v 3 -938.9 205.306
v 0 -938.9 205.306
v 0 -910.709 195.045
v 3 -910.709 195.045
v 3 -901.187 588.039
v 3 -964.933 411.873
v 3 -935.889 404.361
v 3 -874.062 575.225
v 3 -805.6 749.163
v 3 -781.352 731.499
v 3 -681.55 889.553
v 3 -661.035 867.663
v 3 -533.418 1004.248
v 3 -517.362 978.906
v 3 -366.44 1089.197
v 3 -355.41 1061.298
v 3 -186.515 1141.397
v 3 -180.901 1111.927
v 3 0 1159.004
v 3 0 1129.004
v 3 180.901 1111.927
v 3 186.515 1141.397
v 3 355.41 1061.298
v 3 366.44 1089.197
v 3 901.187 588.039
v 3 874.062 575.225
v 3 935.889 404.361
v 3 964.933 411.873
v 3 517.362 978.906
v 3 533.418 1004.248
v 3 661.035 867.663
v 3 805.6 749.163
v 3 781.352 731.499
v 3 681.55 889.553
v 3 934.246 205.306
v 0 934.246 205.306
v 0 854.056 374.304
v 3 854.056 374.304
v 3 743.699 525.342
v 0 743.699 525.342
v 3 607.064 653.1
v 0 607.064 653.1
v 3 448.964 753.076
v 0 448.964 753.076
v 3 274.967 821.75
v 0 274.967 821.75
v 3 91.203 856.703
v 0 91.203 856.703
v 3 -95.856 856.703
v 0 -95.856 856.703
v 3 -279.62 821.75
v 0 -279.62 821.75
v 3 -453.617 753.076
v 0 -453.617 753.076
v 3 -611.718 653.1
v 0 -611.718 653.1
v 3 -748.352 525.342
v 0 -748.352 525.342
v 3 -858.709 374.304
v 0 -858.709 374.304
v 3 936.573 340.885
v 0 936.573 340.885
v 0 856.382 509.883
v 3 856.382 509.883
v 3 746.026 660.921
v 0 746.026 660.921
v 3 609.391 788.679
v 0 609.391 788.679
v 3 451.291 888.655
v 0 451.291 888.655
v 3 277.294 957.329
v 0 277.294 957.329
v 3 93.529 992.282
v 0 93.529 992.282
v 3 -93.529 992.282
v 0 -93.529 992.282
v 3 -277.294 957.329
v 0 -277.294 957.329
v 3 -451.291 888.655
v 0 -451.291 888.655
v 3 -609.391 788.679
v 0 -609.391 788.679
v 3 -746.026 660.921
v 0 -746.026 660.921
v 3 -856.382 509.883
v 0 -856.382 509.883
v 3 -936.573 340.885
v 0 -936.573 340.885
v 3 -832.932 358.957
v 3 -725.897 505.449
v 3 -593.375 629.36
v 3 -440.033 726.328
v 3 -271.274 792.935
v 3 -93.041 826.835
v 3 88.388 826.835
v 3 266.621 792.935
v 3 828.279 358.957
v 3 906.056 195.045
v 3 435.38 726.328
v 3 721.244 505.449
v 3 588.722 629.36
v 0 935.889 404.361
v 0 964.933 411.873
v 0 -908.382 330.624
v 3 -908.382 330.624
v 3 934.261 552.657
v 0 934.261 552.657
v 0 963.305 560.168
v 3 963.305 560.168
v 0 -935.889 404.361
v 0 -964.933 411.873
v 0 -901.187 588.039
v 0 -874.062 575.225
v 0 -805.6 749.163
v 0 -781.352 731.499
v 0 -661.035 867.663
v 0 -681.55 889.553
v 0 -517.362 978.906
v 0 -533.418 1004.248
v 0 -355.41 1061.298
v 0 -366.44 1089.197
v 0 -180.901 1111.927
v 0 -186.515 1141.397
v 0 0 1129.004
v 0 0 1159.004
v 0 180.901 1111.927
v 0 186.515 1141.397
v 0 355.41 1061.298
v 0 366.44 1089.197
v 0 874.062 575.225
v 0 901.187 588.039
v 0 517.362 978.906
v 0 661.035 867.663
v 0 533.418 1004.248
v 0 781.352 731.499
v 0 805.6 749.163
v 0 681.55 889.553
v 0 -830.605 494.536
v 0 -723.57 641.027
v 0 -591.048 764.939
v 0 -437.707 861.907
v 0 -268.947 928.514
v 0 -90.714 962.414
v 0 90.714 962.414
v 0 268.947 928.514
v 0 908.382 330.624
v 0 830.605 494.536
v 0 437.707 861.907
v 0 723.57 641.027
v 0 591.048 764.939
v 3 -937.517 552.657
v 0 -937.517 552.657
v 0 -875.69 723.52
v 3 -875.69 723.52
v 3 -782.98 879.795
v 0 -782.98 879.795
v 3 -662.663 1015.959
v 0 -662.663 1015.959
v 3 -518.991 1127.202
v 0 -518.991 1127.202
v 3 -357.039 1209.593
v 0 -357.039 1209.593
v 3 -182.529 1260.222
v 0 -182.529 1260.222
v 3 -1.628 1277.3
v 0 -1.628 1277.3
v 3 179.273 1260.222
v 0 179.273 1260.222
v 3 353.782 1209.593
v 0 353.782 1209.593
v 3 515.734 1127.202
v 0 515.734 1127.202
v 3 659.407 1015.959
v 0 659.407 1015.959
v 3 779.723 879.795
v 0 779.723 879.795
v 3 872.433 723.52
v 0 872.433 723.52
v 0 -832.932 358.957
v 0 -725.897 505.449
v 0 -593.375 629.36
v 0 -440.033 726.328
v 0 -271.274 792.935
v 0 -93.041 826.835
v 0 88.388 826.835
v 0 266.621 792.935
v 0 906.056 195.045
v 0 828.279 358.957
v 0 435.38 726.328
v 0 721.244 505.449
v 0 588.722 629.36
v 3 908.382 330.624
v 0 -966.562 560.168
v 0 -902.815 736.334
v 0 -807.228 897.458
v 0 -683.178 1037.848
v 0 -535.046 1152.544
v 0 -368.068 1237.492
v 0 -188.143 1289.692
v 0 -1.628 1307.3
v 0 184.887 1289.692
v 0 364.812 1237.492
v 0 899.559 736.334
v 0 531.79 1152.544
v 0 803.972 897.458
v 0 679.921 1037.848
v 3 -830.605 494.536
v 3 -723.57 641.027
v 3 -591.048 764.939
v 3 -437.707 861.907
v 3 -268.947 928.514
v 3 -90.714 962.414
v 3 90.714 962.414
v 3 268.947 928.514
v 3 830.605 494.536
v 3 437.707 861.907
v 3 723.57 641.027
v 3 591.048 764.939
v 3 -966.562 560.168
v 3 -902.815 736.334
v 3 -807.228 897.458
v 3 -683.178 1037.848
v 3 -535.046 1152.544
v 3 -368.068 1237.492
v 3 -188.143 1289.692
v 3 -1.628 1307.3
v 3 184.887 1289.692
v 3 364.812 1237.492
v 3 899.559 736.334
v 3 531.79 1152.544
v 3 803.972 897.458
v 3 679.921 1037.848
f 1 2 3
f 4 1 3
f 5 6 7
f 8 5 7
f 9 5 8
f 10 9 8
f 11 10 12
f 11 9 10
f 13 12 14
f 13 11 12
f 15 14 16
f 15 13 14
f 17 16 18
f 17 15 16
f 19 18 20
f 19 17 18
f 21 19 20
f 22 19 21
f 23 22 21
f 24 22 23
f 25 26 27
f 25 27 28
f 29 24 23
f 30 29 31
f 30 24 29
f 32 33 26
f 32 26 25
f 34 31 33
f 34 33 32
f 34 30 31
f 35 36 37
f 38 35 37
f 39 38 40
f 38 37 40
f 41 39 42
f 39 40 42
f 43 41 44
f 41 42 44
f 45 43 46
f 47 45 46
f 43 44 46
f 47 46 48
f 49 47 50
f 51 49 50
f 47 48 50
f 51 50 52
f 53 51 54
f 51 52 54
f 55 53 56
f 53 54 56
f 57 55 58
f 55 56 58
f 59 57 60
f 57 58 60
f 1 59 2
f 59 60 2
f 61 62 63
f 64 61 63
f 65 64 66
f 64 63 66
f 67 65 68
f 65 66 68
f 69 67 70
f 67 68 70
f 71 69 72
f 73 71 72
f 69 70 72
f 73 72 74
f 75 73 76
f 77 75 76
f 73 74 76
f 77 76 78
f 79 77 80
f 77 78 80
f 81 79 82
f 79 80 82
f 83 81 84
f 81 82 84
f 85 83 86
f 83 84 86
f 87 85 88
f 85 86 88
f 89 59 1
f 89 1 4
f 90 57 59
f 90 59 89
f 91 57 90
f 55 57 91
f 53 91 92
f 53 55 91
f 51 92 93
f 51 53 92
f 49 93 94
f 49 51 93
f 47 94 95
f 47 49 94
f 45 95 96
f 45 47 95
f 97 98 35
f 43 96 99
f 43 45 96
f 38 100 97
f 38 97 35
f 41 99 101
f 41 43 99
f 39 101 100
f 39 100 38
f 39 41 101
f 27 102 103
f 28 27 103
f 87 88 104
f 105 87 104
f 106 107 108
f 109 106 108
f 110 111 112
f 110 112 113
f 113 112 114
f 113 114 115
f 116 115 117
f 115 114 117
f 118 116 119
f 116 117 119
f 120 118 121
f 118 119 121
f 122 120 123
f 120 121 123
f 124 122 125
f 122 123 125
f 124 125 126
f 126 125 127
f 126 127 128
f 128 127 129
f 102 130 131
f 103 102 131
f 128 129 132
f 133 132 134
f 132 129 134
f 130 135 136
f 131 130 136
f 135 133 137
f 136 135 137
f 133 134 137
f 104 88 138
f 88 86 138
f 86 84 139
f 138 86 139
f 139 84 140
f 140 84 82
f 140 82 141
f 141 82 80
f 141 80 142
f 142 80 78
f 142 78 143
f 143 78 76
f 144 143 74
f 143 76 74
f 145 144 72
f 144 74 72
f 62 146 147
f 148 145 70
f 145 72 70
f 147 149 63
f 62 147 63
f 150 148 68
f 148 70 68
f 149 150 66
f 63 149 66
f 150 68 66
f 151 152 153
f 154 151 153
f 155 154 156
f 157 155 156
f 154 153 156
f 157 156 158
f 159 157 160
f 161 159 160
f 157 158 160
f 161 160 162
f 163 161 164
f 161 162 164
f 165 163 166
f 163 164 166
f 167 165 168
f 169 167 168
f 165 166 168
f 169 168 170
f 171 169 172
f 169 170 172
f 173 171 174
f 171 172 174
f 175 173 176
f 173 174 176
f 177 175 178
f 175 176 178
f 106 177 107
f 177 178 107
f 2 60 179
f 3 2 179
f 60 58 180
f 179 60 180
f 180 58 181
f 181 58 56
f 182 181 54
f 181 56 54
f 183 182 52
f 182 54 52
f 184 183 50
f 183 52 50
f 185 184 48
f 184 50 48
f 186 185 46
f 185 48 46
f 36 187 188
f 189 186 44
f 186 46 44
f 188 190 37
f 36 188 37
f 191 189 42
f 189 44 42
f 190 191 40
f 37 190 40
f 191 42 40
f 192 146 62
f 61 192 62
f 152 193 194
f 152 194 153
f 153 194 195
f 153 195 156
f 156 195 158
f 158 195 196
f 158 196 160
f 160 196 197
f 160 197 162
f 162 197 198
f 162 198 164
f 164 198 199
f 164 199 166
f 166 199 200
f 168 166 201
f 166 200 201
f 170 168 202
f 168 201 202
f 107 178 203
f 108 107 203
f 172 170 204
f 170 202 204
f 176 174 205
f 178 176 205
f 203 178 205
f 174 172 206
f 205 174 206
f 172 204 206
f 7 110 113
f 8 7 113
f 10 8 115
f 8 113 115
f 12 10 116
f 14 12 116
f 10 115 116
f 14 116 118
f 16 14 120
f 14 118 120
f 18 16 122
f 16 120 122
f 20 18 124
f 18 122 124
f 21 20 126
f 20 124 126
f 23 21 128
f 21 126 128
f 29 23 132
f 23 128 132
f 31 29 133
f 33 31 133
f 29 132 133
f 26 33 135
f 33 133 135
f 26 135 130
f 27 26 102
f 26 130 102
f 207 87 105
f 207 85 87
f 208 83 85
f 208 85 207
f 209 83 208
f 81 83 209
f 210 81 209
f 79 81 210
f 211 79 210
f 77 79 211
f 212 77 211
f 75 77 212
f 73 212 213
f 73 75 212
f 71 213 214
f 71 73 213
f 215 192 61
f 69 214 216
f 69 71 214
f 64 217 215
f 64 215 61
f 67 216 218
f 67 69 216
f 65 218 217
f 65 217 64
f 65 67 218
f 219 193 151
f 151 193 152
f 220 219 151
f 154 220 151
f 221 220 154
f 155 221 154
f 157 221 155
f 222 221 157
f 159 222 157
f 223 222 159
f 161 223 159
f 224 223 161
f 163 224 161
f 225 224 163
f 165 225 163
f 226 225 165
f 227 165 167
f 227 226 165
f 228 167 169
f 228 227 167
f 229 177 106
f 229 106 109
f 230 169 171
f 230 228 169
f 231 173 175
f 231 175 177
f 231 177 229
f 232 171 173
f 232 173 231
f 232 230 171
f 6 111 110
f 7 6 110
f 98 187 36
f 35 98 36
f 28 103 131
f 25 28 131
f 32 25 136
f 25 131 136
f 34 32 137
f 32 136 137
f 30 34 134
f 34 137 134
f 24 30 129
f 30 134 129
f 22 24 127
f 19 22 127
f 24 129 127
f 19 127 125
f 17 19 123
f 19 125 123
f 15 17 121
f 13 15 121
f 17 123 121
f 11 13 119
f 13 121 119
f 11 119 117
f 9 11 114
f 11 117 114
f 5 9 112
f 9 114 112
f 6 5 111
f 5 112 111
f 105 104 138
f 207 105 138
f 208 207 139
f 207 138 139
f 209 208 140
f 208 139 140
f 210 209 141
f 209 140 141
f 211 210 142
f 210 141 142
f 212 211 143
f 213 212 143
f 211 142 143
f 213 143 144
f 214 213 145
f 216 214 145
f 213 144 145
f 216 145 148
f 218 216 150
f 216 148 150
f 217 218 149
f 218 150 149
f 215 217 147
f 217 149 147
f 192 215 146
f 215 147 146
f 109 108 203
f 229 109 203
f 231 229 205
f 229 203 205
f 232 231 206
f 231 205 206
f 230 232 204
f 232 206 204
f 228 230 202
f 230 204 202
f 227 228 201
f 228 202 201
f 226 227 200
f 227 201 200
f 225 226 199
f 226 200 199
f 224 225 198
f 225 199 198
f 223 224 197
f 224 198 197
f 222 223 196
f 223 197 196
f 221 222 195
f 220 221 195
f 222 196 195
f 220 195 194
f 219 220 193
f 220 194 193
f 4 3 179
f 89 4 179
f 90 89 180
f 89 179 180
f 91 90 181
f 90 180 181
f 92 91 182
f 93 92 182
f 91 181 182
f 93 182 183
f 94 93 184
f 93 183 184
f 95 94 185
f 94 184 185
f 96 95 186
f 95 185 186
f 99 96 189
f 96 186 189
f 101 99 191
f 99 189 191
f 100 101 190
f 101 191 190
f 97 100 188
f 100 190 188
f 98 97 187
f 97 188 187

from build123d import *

# Parameters (mm, degrees)
F1_DEPTH = 3
F3_DEPTH = 3


with BuildPart() as f1:
    # F0 (on Right) → F1 (new body)
    with BuildSketch(Plane.YZ):
        with BuildLine():
            Line((-936.572938, 340.884672), (-908.38216, 330.624067))
            ThreePointArc((-908.38216, 330.624067), (0, 966.680103), (908.38216, 330.624067))
            Line((908.38216, 330.624067), (936.572938, 340.884672))
            ThreePointArc((936.572938, 340.884672), (0, 996.680103), (-936.572938, 340.884672))
        make_face()
        with BuildLine():
            ThreePointArc((934.246348, 205.305699), (-2.32659, 861.10113), (-938.899528, 205.305699))
            Line((-938.899528, 205.305699), (-910.708749, 195.045094))
            ThreePointArc((-910.708749, 195.045094), (-2.32659, 831.10113), (906.05557, 195.045094))
            Line((906.05557, 195.045094), (934.246348, 205.305699))
        make_face()
    extrude(amount=F1_DEPTH)


with BuildPart() as f3:
    # F2 (on Right) → F3 (new body)
    with BuildSketch(Plane.YZ):
        with BuildLine():
            Line((-964.933472, 411.872894), (-935.889042, 404.361494))
            ThreePointArc((-935.889042, 404.361494), (0, 1129.004215), (935.889042, 404.361494))
            Line((935.889042, 404.361494), (964.933472, 411.872894))
            ThreePointArc((964.933472, 411.872894), (0, 1159.004215), (-964.933472, 411.872894))
        make_face()
        with BuildLine():
            Line((-966.561655, 560.168488), (-937.517226, 552.657088))
            ThreePointArc((-937.517226, 552.657088), (-1.628183, 1277.299809), (934.260859, 552.657088))
            Line((934.260859, 552.657088), (963.305288, 560.168488))
            ThreePointArc((963.305288, 560.168488), (-1.628183, 1307.299809), (-966.561655, 560.168488))
        make_face()
    extrude(amount=F3_DEPTH)


solid = Compound([f1.part, f3.part])
